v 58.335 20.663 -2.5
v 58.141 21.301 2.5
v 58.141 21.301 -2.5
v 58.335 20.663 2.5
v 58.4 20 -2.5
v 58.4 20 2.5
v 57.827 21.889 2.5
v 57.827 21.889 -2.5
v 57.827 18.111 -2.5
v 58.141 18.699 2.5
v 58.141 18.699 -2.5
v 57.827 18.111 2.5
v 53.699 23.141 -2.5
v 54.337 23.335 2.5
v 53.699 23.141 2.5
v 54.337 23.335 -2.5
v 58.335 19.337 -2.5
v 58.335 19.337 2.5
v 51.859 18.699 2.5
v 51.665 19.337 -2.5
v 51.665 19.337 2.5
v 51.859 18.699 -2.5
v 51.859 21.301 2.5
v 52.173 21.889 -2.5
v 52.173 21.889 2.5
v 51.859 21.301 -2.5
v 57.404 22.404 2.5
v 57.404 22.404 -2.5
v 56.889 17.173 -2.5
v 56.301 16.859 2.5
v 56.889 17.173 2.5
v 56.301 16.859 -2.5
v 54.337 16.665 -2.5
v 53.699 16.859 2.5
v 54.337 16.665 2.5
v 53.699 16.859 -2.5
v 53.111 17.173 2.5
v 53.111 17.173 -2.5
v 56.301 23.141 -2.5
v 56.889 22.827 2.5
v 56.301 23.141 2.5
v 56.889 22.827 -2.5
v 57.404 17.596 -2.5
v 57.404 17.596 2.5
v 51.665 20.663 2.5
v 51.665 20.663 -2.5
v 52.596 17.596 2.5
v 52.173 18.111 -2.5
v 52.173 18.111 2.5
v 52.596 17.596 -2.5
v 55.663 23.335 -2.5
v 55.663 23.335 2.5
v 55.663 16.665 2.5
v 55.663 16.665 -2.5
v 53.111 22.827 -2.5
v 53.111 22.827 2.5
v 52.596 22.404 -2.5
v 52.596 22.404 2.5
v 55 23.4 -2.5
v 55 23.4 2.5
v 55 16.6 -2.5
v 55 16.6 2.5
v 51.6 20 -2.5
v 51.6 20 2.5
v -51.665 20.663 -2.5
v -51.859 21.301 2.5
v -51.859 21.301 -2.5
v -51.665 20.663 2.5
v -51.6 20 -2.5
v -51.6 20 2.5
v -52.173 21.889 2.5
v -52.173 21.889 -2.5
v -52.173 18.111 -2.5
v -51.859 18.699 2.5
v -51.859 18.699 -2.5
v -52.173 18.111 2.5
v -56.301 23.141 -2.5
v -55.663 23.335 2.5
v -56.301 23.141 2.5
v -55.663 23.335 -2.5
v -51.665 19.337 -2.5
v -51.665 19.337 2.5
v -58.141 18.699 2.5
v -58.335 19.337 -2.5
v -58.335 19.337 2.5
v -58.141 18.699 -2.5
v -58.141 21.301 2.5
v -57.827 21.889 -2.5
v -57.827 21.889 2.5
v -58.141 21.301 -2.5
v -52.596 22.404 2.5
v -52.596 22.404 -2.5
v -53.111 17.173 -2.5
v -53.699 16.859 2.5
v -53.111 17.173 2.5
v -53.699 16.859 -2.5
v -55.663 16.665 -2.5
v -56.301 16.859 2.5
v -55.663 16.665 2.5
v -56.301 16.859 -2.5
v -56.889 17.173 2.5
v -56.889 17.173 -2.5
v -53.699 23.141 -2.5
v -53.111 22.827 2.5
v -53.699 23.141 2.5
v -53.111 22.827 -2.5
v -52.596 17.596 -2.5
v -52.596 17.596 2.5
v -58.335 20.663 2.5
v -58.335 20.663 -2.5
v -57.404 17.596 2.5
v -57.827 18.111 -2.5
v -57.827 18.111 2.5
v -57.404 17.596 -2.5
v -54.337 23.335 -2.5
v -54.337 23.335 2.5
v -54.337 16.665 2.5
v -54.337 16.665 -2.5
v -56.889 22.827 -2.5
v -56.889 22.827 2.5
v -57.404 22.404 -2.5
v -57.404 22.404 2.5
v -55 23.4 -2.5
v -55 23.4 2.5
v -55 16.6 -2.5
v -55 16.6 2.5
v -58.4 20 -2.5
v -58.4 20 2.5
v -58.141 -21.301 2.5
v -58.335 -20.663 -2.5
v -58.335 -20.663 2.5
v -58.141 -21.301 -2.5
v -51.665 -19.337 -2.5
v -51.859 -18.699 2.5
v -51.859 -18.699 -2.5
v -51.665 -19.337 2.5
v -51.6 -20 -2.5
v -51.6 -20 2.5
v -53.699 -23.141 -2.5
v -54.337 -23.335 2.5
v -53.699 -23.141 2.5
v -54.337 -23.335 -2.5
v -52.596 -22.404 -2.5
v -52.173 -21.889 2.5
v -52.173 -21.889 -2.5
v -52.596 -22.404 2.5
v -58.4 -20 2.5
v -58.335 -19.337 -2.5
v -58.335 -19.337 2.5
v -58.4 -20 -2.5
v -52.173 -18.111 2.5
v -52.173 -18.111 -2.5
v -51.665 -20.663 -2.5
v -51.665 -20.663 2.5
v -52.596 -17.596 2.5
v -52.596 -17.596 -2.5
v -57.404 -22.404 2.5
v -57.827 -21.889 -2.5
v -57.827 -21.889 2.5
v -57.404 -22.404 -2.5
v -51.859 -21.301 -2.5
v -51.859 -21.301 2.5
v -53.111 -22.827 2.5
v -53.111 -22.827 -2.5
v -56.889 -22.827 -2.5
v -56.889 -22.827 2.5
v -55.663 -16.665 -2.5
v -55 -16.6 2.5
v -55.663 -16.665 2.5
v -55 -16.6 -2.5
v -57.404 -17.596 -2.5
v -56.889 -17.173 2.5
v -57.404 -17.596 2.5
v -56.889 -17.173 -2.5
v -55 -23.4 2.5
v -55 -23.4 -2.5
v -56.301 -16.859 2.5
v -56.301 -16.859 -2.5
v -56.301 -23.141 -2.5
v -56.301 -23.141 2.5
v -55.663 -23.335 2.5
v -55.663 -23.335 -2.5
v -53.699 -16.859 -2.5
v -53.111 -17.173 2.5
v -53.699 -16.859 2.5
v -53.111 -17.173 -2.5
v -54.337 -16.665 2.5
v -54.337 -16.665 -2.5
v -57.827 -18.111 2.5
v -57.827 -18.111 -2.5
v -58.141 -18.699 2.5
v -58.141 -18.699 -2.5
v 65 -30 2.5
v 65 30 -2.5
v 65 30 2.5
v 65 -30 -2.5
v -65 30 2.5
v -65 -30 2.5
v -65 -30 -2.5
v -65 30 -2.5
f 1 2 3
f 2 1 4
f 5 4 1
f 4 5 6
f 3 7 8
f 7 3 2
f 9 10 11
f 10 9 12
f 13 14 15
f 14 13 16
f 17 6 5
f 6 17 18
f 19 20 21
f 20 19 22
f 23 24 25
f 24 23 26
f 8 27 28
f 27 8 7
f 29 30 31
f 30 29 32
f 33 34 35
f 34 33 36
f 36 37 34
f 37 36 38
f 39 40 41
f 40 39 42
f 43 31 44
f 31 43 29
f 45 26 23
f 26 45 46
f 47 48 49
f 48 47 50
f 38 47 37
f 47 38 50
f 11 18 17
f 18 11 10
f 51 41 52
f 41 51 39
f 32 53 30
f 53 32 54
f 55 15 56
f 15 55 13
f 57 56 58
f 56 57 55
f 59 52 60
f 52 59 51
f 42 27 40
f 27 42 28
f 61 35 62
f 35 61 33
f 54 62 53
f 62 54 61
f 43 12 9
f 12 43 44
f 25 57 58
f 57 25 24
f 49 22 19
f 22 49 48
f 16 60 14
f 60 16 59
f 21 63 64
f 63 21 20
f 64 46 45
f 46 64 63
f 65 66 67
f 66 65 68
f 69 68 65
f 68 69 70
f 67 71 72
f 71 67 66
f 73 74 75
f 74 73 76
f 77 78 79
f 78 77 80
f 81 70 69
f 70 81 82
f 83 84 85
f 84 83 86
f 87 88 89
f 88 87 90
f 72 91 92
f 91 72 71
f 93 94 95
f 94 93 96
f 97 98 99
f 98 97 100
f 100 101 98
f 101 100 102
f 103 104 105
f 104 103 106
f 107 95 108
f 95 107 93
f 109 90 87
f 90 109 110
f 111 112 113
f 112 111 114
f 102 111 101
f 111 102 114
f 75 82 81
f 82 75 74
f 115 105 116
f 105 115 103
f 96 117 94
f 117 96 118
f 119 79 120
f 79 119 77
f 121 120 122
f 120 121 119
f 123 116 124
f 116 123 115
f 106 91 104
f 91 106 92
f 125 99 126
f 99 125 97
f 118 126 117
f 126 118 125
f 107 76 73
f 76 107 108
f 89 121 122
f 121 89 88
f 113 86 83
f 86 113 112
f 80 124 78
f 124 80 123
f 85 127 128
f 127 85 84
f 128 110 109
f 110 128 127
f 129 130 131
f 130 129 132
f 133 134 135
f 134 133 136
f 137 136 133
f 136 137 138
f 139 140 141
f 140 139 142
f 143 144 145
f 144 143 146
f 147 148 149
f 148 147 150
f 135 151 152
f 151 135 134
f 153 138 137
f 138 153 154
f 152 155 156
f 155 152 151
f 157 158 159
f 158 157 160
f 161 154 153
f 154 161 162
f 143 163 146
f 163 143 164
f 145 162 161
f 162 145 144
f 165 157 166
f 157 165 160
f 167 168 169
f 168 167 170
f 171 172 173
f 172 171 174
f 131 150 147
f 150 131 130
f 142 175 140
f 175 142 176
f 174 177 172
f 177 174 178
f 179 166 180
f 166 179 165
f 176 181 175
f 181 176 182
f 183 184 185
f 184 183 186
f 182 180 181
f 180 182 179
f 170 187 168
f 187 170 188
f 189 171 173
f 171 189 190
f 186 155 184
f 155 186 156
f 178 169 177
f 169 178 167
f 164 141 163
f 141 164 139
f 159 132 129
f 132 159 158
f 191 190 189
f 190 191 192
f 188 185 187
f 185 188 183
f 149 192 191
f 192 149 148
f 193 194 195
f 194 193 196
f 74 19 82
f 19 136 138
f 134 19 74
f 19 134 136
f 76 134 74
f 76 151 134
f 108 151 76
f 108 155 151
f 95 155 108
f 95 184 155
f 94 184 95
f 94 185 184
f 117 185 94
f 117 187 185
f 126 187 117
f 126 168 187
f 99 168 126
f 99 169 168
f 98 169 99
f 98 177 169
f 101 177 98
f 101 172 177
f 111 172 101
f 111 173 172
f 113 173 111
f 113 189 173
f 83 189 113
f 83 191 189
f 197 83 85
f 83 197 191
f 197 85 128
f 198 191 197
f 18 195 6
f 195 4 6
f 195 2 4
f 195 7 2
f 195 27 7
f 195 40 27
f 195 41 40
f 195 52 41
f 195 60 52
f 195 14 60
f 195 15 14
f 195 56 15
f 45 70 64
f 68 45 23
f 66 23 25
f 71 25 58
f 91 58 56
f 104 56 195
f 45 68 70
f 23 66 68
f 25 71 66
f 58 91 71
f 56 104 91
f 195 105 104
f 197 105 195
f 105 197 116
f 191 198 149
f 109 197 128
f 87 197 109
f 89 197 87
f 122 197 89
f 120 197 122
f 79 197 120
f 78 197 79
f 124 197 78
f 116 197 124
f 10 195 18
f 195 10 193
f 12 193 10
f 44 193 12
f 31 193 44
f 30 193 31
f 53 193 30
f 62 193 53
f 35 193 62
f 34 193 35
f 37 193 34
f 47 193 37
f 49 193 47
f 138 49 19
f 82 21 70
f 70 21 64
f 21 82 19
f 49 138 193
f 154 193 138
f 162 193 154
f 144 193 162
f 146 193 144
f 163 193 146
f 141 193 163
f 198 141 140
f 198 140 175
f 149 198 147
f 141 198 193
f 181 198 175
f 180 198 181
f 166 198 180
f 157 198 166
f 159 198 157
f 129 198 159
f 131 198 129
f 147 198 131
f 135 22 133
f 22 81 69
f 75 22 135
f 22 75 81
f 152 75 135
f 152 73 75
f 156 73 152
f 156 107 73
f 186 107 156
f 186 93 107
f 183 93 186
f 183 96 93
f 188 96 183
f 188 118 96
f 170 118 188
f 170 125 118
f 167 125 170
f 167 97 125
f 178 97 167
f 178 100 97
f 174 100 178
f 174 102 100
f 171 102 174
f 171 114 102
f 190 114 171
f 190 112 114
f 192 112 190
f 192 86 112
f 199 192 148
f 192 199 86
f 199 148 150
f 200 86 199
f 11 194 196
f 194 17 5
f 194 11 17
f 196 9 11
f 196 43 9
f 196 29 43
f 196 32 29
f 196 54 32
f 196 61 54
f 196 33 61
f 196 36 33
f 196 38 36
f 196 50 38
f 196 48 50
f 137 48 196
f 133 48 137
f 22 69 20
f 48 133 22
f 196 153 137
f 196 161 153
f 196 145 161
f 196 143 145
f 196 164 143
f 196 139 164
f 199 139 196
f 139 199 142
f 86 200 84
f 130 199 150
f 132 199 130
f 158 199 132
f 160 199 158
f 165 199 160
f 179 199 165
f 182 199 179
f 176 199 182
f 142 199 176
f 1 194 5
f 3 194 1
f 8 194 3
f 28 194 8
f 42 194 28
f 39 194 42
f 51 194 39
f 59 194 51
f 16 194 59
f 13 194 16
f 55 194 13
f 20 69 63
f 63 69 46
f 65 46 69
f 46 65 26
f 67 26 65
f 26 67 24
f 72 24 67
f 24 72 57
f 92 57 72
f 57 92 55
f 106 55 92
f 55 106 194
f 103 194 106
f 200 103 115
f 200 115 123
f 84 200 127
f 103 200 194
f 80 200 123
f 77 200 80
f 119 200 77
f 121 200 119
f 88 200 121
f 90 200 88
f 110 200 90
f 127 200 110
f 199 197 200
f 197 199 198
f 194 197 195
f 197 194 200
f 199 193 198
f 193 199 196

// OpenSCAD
$fn = 32;

// ----------------------------------------------------------------------
// Corner plate 130 x 60 x 5
// 3 holes, centres taken from the edge offset
// ----------------------------------------------------------------------

// --- parameters (mm) ---
plate = [130, 60, 5];   // overall size (x, y, z)
holes = 3;              // number of holes the drawing asks for
bore_d = 6.6;           // nominal hole diameter from the drawing
print_allowance = 0.2;  // clearance added for printing
edge = 10;              // hole centre offset from the plate edge

// --- derived feature positions (mm) ---
hole_d = bore_d + print_allowance;  // = 6.8   hole diameter as printed
corner_x = plate[0] / 2 - edge;     // = 55   corner hole X
corner_y = plate[1] / 2 - edge;     // = 20   corner hole Y
feature_centers = [
  [corner_x, corner_y],
  [-corner_x, corner_y],
  [-corner_x, -corner_y]
];   // hole centres the loop below drills

// plate outline, every hole drilled through with the same cutters
difference() {
  cube(plate, center = true);
  for (centre = feature_centers)
    translate([centre[0], centre[1], 0])
      cylinder(d = hole_d, h = plate[2] + 2, center = true);
}
